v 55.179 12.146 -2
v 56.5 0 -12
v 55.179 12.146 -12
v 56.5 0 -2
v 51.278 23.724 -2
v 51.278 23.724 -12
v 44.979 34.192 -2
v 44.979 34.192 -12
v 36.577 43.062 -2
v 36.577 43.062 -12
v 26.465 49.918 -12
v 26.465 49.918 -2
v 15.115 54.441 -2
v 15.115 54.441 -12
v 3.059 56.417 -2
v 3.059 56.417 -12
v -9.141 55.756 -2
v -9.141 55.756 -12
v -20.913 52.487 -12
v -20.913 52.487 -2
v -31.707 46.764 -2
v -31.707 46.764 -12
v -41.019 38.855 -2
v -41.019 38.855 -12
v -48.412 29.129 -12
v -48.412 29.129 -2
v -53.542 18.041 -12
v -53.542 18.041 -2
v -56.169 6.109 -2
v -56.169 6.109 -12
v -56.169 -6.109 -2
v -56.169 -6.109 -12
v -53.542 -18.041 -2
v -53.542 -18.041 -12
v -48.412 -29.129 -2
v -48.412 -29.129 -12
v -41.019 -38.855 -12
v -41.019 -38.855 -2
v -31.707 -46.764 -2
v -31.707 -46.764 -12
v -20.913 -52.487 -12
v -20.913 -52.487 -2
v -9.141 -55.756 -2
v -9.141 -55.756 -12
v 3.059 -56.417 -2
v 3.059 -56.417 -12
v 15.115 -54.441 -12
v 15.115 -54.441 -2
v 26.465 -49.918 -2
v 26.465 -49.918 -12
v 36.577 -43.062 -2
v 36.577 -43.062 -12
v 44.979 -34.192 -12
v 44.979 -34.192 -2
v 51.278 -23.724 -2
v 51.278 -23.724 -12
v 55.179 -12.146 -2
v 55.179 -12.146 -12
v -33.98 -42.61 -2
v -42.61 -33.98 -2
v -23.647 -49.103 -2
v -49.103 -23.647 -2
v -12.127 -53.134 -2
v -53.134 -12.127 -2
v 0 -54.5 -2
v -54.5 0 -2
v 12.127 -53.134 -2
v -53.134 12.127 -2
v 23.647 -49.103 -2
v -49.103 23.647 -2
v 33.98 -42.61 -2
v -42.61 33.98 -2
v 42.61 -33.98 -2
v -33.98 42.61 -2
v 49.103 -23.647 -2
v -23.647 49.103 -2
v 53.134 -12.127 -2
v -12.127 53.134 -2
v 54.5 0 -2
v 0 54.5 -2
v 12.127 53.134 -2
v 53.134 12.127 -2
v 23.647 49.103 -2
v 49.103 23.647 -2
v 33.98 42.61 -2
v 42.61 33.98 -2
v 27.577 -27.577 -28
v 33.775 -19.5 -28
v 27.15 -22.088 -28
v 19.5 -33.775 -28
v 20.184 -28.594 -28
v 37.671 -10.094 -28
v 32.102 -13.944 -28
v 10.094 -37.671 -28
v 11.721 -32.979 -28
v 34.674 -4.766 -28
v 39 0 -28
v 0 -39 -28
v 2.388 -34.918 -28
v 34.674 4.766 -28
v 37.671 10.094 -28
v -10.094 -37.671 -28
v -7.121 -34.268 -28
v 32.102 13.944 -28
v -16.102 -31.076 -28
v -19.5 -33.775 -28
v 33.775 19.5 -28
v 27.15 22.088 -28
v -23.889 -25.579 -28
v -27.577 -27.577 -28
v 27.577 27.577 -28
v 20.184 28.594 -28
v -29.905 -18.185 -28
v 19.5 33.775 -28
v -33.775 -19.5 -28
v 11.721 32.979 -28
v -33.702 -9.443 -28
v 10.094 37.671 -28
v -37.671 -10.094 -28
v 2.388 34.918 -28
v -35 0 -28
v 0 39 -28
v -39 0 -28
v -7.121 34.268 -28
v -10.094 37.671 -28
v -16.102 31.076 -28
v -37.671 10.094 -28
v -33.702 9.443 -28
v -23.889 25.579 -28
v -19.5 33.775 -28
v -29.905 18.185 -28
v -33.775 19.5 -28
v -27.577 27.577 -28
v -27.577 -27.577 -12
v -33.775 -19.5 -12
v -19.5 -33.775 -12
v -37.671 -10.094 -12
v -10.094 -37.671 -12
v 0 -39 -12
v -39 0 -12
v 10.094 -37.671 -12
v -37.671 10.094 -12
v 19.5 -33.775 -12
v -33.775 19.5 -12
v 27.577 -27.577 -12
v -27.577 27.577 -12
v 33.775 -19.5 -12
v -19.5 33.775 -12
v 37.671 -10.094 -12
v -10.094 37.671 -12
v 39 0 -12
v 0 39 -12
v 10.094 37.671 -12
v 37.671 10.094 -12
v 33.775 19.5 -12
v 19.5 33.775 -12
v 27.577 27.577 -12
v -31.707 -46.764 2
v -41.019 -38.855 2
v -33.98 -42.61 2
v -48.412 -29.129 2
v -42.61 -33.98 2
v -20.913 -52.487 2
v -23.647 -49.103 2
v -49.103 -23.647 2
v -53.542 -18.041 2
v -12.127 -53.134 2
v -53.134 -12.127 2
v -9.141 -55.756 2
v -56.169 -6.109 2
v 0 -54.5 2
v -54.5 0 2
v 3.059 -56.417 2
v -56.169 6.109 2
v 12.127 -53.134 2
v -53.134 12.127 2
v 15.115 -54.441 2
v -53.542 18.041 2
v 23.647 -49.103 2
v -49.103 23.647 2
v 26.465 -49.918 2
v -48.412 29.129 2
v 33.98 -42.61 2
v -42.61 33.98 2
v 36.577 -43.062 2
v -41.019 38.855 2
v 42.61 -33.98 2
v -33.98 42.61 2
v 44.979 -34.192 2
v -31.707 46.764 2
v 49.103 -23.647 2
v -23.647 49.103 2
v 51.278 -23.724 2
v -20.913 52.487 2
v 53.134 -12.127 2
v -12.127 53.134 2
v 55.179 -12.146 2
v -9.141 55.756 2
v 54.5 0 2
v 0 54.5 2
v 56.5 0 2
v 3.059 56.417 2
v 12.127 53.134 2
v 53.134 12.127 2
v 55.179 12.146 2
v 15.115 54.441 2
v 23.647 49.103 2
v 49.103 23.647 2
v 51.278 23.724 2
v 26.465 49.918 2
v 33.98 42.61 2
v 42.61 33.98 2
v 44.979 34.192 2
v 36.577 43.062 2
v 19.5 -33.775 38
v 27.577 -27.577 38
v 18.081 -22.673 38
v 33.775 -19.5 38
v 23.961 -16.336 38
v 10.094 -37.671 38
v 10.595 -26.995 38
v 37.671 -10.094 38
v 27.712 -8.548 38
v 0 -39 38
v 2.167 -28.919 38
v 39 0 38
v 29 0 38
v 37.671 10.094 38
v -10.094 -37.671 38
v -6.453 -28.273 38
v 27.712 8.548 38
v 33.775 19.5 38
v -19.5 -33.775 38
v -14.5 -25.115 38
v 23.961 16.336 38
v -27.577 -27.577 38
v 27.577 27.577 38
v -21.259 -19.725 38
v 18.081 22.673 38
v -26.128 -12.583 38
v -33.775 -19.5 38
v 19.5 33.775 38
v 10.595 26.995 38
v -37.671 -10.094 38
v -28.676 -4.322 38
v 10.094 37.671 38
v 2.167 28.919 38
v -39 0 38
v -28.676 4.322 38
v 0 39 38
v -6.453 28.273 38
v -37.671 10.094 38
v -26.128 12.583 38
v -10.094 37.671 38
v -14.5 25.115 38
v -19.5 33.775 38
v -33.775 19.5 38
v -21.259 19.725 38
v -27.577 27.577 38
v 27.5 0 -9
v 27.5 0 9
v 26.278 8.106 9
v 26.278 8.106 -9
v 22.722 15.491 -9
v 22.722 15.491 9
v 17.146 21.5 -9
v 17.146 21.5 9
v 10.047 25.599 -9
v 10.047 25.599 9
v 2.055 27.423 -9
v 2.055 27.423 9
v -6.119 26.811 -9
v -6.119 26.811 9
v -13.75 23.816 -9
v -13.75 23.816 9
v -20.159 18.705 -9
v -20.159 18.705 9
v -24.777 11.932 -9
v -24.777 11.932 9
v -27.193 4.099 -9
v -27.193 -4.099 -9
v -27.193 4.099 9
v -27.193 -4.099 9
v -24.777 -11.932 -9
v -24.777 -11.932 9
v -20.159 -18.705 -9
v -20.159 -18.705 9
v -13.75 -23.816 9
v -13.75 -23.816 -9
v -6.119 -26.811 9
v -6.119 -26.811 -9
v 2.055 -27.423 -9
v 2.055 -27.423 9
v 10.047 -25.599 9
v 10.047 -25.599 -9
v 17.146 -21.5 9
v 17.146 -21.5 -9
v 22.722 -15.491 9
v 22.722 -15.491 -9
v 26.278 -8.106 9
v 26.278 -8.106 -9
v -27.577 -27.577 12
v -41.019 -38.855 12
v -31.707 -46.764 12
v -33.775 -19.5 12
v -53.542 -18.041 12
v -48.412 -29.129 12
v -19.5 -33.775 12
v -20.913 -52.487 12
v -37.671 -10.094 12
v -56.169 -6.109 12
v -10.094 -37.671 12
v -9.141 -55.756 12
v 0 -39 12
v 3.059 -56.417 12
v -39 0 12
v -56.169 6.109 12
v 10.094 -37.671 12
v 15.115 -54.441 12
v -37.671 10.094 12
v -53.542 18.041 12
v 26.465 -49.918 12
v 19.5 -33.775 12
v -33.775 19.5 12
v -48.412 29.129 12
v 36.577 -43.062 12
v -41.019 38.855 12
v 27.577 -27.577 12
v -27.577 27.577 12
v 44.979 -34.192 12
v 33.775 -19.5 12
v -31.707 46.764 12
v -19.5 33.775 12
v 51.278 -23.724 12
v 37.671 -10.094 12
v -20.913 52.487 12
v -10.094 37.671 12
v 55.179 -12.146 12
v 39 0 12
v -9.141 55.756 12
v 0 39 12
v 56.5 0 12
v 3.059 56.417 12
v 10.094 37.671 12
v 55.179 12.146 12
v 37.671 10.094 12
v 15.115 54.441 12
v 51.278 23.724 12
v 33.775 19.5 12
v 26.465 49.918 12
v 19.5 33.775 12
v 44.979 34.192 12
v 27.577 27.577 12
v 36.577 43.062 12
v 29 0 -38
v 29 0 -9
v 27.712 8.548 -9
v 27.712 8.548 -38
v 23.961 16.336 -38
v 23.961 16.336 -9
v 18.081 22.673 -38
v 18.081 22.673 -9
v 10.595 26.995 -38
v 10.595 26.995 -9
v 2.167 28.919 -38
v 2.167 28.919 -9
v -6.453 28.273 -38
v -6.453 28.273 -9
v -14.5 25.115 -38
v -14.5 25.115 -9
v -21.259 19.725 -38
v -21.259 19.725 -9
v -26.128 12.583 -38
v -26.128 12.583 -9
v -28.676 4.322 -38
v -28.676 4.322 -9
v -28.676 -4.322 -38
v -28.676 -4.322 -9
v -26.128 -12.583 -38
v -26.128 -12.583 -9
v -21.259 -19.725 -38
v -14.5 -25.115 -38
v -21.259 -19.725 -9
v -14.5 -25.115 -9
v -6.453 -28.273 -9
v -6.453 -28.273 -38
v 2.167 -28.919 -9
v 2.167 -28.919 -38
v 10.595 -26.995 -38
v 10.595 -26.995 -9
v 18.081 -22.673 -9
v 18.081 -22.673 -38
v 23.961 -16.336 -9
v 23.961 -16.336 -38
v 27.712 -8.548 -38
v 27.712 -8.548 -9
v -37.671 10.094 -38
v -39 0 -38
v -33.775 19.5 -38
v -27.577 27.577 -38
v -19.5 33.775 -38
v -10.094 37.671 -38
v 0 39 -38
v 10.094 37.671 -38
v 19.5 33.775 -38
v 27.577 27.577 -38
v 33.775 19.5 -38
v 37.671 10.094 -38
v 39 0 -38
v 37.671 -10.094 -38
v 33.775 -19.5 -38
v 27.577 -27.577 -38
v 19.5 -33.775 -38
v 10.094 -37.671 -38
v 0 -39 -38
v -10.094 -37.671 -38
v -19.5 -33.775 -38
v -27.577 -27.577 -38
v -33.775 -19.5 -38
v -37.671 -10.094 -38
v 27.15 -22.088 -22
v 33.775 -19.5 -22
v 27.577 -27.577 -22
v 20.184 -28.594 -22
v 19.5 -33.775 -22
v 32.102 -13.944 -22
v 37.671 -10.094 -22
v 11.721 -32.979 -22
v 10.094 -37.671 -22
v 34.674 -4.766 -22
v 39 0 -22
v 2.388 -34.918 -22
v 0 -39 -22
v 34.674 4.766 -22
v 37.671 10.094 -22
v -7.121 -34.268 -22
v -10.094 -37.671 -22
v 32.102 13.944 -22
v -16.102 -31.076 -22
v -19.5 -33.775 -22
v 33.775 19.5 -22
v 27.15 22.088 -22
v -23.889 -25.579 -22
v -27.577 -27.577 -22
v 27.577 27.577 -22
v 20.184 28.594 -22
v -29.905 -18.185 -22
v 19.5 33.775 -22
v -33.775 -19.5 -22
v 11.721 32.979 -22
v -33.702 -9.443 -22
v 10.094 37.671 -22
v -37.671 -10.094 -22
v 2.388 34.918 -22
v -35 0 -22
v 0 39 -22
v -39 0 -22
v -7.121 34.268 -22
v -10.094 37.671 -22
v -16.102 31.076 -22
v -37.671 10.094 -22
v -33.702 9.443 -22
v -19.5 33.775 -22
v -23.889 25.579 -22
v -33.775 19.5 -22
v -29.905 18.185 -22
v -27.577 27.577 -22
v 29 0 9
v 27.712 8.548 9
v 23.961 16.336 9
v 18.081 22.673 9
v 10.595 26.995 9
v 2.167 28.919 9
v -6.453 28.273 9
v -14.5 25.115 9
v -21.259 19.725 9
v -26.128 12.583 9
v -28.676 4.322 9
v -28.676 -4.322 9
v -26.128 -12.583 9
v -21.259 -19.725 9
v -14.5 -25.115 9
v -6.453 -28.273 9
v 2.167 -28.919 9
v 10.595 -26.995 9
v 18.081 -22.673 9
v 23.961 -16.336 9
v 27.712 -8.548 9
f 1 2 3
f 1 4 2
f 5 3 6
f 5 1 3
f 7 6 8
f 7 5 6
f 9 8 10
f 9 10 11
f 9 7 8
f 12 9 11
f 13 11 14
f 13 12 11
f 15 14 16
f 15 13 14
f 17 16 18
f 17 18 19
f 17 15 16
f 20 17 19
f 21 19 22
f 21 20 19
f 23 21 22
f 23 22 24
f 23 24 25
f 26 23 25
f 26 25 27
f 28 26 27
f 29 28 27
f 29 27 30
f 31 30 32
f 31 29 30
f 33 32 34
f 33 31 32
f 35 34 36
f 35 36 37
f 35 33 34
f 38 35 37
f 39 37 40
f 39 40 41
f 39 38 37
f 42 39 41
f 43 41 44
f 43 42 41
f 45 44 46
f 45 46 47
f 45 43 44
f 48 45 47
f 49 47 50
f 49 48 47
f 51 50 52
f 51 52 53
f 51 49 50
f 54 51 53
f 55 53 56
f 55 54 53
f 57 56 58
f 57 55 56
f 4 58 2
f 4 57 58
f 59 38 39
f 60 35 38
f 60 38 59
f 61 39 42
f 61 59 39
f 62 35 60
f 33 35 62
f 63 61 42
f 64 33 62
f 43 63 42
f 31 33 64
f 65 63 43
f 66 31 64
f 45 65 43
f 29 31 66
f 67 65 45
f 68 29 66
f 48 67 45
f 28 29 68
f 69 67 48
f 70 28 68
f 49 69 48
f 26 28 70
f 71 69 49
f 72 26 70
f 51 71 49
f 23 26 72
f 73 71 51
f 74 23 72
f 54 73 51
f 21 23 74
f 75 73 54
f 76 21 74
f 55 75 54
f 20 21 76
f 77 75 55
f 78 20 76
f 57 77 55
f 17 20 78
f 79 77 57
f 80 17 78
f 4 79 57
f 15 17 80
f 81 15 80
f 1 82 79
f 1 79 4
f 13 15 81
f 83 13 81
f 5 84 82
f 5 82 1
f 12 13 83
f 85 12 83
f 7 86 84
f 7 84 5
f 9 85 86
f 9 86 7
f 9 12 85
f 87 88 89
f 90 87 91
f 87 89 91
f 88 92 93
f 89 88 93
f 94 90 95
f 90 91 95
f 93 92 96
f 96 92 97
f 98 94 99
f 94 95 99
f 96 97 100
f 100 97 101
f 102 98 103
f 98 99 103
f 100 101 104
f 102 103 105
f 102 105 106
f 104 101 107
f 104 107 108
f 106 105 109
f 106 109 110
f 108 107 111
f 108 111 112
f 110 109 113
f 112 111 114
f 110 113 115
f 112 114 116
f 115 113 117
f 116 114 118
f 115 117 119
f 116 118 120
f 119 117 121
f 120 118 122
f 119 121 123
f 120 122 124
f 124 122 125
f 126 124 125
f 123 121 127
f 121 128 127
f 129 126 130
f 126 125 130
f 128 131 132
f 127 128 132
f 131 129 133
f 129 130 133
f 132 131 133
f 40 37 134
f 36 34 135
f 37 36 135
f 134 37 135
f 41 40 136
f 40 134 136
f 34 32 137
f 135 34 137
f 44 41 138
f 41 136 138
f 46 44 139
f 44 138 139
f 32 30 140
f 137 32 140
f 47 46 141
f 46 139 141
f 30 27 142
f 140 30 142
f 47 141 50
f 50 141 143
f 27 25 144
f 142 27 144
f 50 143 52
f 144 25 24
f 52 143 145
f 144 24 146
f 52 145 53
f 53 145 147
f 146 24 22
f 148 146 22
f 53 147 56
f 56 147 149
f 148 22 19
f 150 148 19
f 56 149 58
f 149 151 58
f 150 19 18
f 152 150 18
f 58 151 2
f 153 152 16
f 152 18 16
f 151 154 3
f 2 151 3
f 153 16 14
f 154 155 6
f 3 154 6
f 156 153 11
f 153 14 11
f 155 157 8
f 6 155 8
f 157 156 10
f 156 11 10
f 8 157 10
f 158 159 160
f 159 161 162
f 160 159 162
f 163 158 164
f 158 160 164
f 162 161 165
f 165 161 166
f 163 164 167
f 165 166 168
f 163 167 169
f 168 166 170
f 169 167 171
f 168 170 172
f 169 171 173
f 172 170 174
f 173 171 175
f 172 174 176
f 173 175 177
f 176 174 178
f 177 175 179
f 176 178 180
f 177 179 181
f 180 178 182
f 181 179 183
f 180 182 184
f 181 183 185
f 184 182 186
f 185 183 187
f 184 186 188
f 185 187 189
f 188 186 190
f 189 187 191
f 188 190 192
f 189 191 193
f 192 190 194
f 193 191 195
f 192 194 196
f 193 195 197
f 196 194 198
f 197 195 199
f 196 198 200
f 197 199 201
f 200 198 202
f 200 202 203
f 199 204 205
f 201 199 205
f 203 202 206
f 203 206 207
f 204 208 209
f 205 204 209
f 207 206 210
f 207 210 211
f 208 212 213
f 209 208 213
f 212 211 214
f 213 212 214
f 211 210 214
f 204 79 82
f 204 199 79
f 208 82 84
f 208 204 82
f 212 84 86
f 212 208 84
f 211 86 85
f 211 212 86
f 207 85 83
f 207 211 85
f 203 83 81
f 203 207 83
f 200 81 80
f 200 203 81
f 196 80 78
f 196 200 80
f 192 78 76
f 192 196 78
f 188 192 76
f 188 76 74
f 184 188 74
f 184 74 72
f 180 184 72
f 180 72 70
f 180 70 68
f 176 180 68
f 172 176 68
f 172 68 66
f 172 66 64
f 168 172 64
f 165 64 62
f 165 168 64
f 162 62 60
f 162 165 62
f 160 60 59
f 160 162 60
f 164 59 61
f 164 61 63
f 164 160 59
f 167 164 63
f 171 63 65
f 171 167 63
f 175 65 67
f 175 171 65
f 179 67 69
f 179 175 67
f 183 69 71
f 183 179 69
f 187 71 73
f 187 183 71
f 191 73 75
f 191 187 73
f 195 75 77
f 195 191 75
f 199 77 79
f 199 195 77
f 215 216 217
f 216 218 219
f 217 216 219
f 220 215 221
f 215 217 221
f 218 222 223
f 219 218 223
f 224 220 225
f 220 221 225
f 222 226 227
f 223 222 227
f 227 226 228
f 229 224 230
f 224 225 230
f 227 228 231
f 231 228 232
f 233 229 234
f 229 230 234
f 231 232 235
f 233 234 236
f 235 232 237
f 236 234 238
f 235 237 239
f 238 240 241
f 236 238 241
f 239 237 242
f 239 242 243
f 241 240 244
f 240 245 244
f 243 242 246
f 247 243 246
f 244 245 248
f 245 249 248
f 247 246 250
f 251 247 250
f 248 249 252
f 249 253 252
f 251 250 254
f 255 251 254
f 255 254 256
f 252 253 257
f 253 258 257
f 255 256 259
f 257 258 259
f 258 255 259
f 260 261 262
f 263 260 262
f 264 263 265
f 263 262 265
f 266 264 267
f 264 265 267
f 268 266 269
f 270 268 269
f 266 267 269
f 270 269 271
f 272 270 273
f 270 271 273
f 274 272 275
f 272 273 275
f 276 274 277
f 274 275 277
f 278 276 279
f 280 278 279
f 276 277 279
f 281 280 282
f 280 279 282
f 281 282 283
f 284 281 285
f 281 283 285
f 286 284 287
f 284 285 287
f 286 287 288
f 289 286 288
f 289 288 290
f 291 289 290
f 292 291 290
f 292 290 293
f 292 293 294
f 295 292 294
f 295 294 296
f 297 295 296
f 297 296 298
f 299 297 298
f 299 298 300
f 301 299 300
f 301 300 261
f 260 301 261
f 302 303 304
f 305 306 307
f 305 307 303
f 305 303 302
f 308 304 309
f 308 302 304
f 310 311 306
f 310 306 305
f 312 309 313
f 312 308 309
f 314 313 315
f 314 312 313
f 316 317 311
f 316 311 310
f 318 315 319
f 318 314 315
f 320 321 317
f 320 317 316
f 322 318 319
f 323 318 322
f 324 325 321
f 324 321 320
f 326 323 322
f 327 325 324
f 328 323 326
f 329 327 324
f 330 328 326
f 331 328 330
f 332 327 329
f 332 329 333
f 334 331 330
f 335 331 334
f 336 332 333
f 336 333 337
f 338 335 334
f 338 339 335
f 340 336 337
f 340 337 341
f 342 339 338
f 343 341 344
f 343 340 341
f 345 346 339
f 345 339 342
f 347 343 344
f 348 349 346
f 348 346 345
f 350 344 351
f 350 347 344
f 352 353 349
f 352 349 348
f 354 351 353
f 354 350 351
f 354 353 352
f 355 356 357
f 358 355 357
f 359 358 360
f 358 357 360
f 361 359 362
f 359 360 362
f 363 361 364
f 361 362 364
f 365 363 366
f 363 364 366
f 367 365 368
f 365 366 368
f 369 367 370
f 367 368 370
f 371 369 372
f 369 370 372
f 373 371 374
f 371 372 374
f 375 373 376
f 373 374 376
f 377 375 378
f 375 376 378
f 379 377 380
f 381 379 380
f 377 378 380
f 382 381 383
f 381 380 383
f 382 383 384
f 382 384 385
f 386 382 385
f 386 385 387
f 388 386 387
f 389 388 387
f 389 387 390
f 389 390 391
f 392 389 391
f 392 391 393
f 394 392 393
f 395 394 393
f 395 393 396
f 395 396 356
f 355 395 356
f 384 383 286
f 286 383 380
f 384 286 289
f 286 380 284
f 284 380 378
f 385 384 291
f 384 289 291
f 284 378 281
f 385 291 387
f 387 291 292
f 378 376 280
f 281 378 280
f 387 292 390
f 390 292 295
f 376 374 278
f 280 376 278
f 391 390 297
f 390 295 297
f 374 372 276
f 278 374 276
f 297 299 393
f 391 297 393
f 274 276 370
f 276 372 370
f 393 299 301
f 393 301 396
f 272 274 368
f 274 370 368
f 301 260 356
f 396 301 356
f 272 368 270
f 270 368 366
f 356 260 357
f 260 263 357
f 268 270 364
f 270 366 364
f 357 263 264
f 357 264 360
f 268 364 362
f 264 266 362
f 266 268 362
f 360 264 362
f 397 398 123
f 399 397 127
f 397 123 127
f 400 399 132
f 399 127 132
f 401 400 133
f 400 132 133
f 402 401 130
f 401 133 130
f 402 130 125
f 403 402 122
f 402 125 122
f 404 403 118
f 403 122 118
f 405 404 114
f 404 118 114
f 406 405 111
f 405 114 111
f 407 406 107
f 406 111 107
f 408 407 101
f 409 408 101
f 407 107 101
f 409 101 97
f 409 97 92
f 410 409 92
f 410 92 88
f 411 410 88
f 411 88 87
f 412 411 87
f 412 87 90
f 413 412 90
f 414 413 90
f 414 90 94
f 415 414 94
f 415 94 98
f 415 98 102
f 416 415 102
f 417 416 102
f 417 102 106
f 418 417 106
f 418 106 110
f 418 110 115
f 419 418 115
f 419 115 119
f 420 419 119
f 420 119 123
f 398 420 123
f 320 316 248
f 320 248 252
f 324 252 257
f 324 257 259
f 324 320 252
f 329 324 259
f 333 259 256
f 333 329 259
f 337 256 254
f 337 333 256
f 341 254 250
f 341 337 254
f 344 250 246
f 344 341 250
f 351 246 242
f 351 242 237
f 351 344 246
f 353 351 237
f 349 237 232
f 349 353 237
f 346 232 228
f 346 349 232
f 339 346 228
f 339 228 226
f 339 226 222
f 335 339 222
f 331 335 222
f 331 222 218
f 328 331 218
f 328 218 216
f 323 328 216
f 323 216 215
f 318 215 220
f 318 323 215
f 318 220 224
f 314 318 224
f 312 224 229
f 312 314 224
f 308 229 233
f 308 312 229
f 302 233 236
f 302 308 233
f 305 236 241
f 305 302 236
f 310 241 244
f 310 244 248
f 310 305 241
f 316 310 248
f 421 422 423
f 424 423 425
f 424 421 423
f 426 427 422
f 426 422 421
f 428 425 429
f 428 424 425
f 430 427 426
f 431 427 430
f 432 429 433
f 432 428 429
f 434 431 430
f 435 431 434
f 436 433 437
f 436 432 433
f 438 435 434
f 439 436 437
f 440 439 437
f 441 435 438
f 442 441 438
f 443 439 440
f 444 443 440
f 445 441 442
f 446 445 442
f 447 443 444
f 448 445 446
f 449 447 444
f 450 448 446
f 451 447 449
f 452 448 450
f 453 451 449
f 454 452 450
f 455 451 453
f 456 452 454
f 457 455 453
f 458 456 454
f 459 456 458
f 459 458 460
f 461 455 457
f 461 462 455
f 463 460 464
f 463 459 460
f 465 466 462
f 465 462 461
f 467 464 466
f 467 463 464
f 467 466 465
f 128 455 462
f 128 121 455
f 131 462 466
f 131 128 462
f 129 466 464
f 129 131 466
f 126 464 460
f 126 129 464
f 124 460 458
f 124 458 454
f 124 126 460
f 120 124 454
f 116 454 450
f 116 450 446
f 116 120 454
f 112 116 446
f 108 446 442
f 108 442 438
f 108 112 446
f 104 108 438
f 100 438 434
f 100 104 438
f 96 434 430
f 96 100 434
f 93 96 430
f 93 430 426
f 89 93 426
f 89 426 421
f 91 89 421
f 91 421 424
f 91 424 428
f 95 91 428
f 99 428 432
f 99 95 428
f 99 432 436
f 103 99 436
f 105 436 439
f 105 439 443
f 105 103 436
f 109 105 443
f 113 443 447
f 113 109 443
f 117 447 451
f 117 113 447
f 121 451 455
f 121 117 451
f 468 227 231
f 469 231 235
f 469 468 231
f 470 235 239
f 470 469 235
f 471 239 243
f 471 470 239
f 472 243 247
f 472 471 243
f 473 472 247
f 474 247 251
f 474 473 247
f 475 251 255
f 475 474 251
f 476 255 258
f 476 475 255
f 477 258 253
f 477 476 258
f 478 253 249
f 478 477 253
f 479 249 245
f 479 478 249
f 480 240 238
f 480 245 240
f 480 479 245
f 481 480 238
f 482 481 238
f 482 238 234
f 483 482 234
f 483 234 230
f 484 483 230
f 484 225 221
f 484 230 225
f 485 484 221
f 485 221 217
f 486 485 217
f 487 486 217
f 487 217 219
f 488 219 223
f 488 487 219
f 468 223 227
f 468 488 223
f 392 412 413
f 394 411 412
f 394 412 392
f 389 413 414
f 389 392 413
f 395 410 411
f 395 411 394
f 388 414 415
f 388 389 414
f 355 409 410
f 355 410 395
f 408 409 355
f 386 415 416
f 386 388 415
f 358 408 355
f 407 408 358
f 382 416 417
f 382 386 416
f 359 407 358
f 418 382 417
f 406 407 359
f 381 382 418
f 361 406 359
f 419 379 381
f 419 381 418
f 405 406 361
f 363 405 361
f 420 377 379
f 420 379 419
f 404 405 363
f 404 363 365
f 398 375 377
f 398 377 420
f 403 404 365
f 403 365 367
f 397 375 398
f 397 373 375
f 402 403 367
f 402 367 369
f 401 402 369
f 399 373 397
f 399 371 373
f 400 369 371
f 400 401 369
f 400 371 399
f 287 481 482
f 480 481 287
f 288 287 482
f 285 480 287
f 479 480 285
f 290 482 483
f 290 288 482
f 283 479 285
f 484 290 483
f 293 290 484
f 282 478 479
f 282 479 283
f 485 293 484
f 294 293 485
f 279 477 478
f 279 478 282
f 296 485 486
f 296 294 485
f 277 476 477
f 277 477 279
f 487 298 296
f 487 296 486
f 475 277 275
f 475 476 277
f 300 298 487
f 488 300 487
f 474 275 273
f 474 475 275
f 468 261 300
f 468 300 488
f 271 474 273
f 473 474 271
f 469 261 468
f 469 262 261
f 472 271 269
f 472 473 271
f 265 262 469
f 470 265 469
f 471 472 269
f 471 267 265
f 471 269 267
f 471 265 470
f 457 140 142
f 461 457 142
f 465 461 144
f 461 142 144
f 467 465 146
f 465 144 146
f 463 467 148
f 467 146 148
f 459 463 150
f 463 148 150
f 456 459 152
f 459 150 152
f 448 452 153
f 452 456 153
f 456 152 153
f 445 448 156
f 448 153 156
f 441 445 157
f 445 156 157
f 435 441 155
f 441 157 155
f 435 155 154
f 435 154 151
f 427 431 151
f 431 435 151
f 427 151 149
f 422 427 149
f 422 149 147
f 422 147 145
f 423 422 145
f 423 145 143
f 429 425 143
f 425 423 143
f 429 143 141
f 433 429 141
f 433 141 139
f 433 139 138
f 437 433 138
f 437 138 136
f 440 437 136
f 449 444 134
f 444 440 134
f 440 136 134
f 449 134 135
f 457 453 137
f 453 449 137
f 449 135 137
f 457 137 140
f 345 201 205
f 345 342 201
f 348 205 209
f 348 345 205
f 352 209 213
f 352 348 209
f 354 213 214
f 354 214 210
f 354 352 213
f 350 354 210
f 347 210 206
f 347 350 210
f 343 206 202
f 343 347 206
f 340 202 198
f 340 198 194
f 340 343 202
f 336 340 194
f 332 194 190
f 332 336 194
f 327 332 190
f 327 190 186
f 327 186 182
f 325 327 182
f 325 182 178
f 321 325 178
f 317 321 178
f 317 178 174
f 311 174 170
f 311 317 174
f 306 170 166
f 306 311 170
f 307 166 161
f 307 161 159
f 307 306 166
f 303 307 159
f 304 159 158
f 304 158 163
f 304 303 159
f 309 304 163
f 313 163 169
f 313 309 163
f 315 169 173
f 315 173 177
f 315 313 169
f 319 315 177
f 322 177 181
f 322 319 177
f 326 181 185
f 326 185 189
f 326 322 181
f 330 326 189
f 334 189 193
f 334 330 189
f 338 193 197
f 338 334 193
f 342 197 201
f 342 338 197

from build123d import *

# Parameters (mm, degrees)
EXTRUDE_1_DEPTH          = 12
EXTRUDE_1_DEPTH_BACK     = 12
SKETCH_1_R               = 56.5
CUT_EXTRUDE_1_DEPTH      = 2
CUT_EXTRUDE_1_DEPTH_BACK = 2
SKETCH_2_R               = 74.899602785
SKETCH_2_R_2             = 54.5
SKETCH_3_R               = 39
EXTRUDE_2_DEPTH          = 26
CUT_EXTRUDE_2_DEPTH      = 3
CUT_EXTRUDE_2_DEPTH_BACK = 3
SKETCH_4_R               = 52.483360518
SKETCH_4_R_2             = 35
SKETCH_5_R               = 27.5
CUT_EXTRUDE_3_DEPTH      = 80
SKETCH_6_R               = 29
CUT_EXTRUDE_4_DEPTH      = 50


with BuildPart() as part:
    # 草图1 → 凸台-拉伸1 (new, two sides: drawn at the far end of the back side and taken through both)
    with BuildSketch(Plane.XY.offset(-EXTRUDE_1_DEPTH_BACK)):
        Circle(SKETCH_1_R)
    extrude(amount=EXTRUDE_1_DEPTH + EXTRUDE_1_DEPTH_BACK)

    # 草图2 → 切除-拉伸1 (cut, two sides: drawn at the far end of the back side and taken through both)
    with BuildSketch(Plane.XY.offset(-CUT_EXTRUDE_1_DEPTH_BACK)):
        Circle(SKETCH_2_R)
        Circle(SKETCH_2_R_2, mode=Mode.SUBTRACT)
    extrude(amount=CUT_EXTRUDE_1_DEPTH + CUT_EXTRUDE_1_DEPTH_BACK, mode=Mode.SUBTRACT)

    # 草图3 → 凸台-拉伸2 (add)
    with BuildSketch(Plane(origin=(0, 0, -12), x_dir=(-1, 0, 0), z_dir=(0, 0, -1))):
        Circle(SKETCH_3_R)
    extrude_2 = extrude(amount=EXTRUDE_2_DEPTH)

    # 镜向1: 凸台-拉伸2 across plane
    add(extrude_2.mirror(Plane.XY))

    # 草图4 → 切除-拉伸2 (cut, two sides: drawn at the far end of the back side and taken through both)
    with BuildSketch(Plane(origin=(0, 0, -25), x_dir=(-1, 0, 0), z_dir=(0, 0, -1)).offset(-CUT_EXTRUDE_2_DEPTH_BACK)):
        Circle(SKETCH_4_R)
        Circle(SKETCH_4_R_2, mode=Mode.SUBTRACT)
    extrude(amount=CUT_EXTRUDE_2_DEPTH + CUT_EXTRUDE_2_DEPTH_BACK, mode=Mode.SUBTRACT)

    # 草图5 → 切除-拉伸3 (cut)
    with BuildSketch(Plane.XY.offset(38)):
        Circle(SKETCH_5_R)
    extrude(amount=-CUT_EXTRUDE_3_DEPTH, mode=Mode.SUBTRACT)

    # 草图6 → 切除-拉伸4 (cut)
    with BuildSketch(Plane.XY.offset(9)):
        Circle(SKETCH_6_R)
    cut_extrude_4 = extrude(amount=CUT_EXTRUDE_4_DEPTH, mode=Mode.SUBTRACT)

    # 镜向2: 切除-拉伸4 across plane
    add(cut_extrude_4.mirror(Plane.XY), mode=Mode.SUBTRACT)


solid = part.part
